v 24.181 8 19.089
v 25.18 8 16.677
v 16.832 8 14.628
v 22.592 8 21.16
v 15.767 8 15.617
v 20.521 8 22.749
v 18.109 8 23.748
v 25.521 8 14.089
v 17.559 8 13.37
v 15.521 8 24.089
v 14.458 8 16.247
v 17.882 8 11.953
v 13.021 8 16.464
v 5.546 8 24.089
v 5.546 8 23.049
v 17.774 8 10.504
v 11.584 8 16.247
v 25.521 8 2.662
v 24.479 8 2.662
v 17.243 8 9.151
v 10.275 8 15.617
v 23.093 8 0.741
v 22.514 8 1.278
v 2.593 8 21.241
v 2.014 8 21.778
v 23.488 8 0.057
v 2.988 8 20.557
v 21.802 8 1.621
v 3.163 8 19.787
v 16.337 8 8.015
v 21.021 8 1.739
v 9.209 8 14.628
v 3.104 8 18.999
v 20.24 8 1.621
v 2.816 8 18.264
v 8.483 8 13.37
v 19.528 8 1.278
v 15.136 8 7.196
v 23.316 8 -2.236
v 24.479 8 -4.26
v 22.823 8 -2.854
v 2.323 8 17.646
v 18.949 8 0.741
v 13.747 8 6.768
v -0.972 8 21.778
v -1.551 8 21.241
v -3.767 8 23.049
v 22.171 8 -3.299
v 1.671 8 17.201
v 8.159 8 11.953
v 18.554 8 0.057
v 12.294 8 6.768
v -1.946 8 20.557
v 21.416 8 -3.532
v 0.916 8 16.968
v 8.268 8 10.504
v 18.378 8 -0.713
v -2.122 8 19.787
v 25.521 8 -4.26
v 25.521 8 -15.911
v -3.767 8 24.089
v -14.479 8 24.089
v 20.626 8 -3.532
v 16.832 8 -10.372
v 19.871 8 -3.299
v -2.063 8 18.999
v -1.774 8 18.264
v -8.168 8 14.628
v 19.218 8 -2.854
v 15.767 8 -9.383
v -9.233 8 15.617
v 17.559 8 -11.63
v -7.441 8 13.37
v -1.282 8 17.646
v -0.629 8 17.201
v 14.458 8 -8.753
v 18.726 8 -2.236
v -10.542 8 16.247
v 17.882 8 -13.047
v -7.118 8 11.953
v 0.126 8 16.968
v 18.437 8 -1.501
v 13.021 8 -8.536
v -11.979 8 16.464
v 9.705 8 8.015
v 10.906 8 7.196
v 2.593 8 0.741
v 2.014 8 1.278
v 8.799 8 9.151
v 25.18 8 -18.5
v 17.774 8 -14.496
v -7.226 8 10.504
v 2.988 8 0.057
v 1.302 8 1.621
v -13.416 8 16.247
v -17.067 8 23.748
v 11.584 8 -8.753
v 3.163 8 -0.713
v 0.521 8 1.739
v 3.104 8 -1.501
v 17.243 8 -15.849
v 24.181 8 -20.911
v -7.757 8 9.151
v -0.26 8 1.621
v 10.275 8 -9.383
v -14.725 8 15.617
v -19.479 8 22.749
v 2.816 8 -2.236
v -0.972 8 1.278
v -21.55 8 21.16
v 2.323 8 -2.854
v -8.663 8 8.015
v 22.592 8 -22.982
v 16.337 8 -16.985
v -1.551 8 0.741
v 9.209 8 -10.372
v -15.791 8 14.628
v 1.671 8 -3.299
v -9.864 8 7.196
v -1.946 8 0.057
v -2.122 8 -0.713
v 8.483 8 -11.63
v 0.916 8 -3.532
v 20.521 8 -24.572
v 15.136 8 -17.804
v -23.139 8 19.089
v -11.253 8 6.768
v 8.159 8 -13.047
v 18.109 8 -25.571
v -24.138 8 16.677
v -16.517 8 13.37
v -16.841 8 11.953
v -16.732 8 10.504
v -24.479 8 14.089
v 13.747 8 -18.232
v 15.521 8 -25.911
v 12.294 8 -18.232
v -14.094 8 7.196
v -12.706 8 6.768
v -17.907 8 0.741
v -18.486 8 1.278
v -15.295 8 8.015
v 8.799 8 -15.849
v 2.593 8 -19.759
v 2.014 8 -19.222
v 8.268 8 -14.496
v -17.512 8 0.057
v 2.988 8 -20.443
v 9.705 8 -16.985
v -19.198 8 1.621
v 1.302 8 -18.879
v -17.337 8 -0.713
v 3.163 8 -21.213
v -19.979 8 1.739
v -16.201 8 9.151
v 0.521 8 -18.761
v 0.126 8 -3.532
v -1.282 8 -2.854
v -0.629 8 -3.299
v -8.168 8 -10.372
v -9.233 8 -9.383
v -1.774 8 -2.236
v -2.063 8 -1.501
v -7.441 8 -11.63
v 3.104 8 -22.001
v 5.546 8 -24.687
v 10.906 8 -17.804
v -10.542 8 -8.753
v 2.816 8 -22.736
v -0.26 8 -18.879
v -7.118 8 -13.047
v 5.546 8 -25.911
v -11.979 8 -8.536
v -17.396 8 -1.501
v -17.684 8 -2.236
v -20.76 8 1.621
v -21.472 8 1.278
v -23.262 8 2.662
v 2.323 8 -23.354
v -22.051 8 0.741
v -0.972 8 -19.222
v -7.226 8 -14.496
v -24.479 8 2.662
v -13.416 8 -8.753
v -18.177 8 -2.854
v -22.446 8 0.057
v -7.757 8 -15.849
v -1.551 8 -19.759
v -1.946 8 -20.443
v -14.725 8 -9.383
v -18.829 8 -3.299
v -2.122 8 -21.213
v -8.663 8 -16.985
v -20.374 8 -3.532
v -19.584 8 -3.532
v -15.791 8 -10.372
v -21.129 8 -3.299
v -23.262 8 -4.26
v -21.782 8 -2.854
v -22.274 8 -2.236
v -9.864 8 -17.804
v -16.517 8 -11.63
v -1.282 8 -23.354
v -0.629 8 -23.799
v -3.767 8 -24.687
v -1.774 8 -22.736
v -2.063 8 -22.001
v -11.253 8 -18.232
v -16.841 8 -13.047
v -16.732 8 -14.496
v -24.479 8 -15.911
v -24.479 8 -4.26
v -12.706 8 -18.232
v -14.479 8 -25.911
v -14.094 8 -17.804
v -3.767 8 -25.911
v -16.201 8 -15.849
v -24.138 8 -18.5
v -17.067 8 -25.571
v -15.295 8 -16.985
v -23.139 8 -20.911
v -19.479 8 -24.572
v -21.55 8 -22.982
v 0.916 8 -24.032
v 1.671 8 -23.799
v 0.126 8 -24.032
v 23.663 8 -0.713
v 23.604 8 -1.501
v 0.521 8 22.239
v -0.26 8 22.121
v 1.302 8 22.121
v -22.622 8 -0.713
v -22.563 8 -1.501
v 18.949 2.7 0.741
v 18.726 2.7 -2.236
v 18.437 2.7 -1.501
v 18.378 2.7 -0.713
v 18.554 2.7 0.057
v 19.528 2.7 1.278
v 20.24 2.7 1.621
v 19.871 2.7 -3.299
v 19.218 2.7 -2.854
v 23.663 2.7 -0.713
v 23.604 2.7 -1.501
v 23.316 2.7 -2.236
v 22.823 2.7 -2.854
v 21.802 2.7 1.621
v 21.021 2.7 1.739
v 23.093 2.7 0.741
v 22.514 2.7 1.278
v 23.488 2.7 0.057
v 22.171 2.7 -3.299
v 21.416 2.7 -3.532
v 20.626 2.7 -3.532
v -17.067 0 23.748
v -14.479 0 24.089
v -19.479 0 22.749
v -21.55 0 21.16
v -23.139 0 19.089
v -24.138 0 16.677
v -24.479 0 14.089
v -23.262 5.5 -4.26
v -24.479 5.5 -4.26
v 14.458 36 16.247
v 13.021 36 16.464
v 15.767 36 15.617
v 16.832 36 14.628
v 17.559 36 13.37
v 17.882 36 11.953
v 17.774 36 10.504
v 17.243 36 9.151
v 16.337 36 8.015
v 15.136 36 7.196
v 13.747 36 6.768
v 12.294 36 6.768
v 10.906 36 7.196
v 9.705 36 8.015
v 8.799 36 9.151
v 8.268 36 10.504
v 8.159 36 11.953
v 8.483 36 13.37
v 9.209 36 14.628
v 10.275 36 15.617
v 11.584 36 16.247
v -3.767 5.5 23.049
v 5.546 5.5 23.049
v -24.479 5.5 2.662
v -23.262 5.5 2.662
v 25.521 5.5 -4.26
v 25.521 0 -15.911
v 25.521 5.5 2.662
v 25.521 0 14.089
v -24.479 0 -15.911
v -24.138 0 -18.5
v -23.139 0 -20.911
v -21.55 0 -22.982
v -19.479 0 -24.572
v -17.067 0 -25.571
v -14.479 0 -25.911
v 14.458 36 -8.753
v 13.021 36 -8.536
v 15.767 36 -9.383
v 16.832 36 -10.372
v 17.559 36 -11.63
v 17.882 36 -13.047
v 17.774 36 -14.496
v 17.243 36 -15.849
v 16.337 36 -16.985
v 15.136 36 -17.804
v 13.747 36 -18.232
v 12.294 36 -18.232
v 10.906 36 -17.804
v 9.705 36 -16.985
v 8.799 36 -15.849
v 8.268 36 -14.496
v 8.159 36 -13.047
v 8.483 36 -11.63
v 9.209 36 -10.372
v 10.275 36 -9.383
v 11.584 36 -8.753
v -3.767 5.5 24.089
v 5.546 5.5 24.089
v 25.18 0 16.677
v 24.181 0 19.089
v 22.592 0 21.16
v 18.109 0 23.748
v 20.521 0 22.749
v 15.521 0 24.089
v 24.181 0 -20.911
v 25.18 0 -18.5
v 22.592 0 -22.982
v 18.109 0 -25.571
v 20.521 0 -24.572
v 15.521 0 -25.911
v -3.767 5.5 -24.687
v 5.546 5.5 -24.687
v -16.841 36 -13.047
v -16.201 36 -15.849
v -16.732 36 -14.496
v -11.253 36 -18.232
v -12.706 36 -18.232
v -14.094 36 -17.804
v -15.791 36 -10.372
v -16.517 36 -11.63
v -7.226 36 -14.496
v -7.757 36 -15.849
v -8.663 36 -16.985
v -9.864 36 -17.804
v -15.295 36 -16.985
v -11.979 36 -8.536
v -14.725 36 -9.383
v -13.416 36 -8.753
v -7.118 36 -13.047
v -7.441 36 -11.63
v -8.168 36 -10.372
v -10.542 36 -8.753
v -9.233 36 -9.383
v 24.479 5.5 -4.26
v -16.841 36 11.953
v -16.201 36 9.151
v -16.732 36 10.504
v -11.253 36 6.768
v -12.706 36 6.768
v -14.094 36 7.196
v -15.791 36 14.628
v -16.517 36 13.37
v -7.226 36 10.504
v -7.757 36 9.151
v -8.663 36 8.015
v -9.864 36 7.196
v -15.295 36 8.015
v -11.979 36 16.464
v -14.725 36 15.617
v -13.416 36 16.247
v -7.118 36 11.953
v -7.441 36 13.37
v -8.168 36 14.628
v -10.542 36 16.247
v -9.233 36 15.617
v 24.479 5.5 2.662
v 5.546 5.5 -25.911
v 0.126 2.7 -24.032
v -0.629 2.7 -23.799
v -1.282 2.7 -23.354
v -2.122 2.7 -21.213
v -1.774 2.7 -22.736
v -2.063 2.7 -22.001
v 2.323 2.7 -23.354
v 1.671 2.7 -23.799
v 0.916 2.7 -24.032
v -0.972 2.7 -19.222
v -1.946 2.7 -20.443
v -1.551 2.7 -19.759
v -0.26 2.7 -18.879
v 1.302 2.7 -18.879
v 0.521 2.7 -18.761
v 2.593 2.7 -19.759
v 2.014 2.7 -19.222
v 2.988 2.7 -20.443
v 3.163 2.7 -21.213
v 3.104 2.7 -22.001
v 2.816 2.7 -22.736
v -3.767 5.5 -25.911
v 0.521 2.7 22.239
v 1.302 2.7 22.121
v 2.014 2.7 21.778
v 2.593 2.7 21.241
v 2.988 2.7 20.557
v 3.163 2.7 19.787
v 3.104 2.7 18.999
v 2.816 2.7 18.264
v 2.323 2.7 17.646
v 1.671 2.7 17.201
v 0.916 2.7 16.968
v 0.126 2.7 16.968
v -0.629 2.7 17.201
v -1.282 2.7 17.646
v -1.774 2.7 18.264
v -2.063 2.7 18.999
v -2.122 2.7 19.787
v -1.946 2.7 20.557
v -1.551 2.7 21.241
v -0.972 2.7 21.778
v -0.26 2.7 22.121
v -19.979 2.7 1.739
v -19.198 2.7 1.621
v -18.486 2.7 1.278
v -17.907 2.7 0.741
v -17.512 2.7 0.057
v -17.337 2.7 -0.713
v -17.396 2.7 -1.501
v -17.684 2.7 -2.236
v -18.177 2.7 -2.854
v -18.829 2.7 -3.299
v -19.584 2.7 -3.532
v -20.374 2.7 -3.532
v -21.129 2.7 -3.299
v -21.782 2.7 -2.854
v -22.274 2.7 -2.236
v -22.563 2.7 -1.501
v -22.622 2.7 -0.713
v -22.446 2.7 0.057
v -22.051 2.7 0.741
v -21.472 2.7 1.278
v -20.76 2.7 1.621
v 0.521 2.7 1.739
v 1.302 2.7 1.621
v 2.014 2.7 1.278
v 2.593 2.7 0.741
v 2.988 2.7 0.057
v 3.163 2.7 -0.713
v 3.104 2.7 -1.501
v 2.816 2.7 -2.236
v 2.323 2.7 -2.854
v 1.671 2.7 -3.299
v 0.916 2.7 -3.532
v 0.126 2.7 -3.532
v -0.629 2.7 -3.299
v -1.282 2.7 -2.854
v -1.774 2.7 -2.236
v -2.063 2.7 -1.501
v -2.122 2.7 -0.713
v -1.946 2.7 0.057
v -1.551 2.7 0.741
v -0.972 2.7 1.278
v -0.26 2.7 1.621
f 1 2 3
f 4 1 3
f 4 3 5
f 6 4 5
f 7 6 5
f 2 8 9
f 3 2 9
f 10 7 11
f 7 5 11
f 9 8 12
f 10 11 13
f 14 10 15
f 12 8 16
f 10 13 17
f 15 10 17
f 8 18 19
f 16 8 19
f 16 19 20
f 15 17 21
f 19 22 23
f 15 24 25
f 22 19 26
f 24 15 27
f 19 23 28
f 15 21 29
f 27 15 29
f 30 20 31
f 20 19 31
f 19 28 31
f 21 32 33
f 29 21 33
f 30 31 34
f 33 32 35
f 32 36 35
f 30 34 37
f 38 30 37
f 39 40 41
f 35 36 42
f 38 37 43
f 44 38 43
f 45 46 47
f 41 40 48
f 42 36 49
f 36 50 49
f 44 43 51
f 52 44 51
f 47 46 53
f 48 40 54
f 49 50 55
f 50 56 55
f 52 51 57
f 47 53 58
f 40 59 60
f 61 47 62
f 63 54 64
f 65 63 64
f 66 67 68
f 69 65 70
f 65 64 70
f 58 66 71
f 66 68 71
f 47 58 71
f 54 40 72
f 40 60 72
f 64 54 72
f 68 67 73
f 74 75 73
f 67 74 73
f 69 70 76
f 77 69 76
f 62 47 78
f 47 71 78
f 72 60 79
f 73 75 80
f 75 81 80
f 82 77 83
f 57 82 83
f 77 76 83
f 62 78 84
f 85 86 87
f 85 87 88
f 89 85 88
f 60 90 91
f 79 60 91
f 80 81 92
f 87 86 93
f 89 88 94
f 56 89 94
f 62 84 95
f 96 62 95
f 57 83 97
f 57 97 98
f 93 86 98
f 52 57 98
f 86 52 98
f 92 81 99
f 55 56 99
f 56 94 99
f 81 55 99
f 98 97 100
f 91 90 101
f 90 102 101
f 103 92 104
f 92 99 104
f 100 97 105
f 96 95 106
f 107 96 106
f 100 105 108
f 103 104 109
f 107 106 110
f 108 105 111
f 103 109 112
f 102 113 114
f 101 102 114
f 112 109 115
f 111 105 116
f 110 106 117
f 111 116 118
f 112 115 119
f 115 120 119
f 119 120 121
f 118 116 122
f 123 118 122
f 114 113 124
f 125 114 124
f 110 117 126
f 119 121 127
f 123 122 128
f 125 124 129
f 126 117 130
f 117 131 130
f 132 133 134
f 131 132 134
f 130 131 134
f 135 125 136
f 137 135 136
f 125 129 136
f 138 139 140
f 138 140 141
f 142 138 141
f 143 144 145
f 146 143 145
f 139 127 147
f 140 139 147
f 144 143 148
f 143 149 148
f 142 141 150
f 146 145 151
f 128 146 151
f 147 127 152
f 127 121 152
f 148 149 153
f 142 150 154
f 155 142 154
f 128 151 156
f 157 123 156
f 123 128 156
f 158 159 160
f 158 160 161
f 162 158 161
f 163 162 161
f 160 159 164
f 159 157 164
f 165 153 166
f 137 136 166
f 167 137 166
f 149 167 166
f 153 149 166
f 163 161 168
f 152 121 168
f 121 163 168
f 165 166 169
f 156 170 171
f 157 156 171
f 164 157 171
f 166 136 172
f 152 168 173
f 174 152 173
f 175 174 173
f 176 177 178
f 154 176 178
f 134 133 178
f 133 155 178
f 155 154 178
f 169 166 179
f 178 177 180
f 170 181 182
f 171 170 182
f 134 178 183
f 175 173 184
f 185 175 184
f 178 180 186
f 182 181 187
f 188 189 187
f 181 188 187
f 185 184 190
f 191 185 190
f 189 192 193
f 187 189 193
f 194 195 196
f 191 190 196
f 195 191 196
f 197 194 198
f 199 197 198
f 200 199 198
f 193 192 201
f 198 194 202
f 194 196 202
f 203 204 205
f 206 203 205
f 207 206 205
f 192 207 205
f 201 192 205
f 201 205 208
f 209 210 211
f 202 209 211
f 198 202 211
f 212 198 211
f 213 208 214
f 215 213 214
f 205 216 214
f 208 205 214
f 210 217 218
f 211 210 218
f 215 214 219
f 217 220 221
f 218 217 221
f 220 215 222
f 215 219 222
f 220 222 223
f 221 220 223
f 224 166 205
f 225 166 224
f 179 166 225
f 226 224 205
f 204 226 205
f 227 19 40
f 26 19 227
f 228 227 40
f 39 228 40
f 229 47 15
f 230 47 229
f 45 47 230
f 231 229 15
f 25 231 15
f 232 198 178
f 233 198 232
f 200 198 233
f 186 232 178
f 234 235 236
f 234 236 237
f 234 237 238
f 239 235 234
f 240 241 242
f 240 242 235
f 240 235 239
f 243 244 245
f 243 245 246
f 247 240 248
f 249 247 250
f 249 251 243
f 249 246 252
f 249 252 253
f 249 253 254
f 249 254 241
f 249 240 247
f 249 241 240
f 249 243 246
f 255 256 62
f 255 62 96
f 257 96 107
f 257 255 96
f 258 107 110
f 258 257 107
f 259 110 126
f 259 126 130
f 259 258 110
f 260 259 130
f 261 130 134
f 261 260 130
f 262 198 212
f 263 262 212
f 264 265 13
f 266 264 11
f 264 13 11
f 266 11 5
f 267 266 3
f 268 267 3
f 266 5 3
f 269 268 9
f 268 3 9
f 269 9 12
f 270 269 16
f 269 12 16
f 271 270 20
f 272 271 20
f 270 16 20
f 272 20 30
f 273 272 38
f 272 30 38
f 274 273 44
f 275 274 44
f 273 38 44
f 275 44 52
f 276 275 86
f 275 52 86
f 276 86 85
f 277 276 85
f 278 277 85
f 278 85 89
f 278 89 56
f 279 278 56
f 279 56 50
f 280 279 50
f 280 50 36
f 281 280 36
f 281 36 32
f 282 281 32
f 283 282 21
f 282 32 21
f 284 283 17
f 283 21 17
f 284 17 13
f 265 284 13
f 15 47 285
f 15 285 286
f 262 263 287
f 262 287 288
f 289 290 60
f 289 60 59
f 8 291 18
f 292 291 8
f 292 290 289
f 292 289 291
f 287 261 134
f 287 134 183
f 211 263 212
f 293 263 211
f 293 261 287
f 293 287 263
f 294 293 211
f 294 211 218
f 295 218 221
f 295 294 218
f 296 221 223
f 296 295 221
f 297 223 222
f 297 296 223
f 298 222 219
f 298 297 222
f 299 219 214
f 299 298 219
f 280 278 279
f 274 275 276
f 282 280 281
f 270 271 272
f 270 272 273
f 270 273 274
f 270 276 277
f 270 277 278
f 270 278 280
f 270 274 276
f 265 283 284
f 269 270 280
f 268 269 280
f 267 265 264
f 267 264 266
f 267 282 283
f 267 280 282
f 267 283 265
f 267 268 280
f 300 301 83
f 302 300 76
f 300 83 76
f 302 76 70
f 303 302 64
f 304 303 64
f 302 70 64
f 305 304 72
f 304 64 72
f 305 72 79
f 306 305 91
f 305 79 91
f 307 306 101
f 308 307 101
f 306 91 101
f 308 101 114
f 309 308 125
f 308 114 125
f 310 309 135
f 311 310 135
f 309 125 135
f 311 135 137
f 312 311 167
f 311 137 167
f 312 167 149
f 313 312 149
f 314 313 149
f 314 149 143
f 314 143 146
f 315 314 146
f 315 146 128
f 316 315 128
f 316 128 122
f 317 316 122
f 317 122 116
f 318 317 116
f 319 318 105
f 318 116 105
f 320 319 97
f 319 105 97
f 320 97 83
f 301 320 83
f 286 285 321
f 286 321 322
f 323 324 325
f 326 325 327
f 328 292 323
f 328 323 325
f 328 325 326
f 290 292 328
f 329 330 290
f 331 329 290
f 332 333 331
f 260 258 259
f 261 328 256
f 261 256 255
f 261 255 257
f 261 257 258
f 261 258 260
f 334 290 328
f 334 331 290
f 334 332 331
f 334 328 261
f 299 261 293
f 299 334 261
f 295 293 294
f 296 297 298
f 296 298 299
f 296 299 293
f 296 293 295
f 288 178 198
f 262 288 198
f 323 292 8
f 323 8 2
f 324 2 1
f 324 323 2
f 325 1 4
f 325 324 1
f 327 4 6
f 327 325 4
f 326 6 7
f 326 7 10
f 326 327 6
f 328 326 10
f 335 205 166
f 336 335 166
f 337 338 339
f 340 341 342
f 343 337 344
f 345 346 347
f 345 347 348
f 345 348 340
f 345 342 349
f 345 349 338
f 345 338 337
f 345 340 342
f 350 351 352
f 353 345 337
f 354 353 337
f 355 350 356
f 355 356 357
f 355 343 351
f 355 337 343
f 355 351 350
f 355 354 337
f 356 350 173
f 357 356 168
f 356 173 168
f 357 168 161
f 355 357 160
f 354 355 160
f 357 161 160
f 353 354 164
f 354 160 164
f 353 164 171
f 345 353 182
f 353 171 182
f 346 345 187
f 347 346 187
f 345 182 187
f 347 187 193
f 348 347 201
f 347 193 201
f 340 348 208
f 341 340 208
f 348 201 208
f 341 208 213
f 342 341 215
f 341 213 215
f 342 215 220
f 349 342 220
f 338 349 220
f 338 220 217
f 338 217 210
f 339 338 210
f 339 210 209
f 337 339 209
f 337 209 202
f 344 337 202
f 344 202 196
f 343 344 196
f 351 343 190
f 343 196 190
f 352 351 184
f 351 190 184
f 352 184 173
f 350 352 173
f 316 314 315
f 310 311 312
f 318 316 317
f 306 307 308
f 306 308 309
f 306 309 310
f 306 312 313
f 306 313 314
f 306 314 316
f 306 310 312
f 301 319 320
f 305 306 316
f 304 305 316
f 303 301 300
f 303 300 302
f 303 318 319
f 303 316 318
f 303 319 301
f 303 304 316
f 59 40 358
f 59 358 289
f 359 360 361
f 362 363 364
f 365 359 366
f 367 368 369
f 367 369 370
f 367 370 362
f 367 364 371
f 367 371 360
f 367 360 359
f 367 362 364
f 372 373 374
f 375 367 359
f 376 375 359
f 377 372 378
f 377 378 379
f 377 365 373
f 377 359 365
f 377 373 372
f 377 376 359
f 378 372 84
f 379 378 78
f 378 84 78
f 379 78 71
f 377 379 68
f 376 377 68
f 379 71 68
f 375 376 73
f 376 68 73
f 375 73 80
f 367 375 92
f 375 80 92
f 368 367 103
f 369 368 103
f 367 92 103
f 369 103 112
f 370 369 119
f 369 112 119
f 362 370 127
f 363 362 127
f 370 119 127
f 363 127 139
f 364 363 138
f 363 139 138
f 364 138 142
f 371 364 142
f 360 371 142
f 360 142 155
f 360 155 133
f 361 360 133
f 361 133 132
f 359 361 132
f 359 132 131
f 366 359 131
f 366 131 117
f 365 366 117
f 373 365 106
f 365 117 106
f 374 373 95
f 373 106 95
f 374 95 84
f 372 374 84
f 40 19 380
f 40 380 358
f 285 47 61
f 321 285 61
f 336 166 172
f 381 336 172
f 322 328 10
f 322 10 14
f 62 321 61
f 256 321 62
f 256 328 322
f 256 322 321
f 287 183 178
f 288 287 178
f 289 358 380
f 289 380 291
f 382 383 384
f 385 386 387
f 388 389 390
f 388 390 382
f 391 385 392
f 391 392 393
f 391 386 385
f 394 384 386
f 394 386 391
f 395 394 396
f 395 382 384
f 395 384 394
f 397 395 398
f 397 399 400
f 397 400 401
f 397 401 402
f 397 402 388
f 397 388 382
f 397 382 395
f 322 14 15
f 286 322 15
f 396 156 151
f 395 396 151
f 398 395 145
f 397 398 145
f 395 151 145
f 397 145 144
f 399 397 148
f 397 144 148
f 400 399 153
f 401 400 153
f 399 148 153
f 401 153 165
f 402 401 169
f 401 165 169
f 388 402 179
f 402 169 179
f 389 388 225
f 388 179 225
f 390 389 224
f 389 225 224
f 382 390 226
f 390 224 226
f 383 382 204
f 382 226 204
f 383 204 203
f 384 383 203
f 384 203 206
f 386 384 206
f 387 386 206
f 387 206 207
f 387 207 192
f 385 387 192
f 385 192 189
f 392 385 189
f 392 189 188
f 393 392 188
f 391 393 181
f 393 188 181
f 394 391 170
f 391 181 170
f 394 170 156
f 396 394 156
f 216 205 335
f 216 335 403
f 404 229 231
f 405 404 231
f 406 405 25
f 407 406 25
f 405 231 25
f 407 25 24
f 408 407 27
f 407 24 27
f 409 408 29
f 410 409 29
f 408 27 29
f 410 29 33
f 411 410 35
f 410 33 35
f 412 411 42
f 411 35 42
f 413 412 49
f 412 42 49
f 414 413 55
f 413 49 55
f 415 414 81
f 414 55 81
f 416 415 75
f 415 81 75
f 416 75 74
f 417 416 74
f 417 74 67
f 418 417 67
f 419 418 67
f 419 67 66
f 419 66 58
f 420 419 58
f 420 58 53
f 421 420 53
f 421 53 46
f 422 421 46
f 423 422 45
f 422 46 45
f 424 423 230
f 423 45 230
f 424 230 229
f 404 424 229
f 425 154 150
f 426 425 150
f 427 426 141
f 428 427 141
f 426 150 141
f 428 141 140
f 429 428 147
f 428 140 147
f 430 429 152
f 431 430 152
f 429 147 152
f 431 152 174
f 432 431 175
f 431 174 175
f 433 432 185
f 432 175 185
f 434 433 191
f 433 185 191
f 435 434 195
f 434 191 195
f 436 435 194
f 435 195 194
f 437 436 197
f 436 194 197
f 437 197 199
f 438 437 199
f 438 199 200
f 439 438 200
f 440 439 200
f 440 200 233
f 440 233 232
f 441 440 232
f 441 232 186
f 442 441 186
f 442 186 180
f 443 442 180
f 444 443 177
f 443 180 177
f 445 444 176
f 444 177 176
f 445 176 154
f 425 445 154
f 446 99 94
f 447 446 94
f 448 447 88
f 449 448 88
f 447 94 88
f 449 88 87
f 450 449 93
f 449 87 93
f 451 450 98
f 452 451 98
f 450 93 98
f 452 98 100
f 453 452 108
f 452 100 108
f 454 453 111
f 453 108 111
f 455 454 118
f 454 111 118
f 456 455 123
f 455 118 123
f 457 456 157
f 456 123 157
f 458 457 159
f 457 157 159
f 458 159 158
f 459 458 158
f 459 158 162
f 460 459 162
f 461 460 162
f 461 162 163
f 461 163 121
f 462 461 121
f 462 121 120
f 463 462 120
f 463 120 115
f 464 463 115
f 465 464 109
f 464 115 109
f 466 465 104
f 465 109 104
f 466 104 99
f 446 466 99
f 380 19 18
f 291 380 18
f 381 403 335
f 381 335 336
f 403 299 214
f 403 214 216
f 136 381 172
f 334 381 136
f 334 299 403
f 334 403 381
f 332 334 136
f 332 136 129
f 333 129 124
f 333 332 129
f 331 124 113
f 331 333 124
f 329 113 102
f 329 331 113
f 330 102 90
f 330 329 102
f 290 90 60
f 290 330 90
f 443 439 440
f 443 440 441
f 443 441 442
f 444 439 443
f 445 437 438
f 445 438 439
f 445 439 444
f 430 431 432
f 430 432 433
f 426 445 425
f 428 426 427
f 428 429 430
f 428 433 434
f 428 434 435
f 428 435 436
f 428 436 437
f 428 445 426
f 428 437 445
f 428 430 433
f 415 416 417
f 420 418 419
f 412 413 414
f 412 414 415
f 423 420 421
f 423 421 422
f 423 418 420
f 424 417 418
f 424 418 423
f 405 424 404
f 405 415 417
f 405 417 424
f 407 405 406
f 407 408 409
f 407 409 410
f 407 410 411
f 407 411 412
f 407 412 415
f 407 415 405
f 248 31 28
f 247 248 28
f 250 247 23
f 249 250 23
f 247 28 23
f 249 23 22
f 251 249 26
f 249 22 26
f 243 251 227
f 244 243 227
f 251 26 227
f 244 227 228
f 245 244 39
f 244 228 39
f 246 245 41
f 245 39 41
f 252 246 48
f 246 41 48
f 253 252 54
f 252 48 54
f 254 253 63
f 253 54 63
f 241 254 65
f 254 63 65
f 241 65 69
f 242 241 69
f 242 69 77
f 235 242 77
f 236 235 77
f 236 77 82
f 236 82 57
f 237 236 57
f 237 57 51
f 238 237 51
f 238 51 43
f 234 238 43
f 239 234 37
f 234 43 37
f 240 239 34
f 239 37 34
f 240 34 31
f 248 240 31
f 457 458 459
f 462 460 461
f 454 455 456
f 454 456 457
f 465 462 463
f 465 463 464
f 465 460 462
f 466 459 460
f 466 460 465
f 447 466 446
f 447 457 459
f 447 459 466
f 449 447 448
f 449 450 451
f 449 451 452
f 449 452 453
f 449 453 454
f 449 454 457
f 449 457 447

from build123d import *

# Parameters (mm, degrees)
SALIENTE_EXTRUIR1_DEPTH = 8
CROQUIS2_R              = 4.875
SALIENTE_EXTRUIR2_DEPTH = 28
MATRIZL1_COUNT          = 2
MATRIZL1_PITCH          = 25
MATRIZL1_COUNT_DIR2     = 2
MATRIZL1_PITCH_DIR2     = 25
CROQUIS3_R              = 2.65
CORTAR_EXTRUIR1_DEPTH   = 5.3
CROQUIS4_W              = 9.313425885
CROQUIS4_H              = 1.82271115
CROQUIS4_H_2            = 1.039944003
CROQUIS4_W_2            = 1.041549228
CROQUIS4_H_3            = 6.922662644
CROQUIS4_H_4            = 1.224371708
CORTAR_EXTRUIR2_DEPTH   = 2.5


with BuildPart() as part:
    # Croquis1 → Saliente-Extruir1 (new body)
    with BuildSketch(Plane(origin=(0, 0, 0), x_dir=(1, 0, 0), z_dir=(0, 1, 0))):
        with BuildLine():
            Line((-14.479225386, 25.911355575), (15.520774614, 25.911355575))
            ThreePointArc((15.520774614, 25.911355575), (22.591842426, 22.982423386), (25.520774614, 15.911355575))
            Line((25.520774614, 15.911355575), (25.520774614, -14.088644425))
            ThreePointArc((25.520774614, -14.088644425), (22.591842426, -21.159712237), (15.520774614, -24.088644425))
            Line((15.520774614, -24.088644425), (-14.479225386, -24.088644425))
            ThreePointArc((-14.479225386, -24.088644425), (-21.550293198, -21.159712237), (-24.479225386, -14.088644425))
            Line((-24.479225386, -14.088644425), (-24.479225386, 15.911355575))
            ThreePointArc((-24.479225386, 15.911355575), (-21.550293198, 22.982423386), (-14.479225386, 25.911355575))
        make_face()
    extrude(amount=SALIENTE_EXTRUIR1_DEPTH)

    # Croquis2 → Saliente-Extruir2 (add)
    with BuildSketch(Plane(origin=(0, 8, 0), x_dir=(1, 0, 0), z_dir=(0, 1, 0))):
        with Locations(Location((-11.979225386, 13.411355575, 0), (0, 0, 270))):
            Circle(CROQUIS2_R)
    saliente_extruir2 = extrude(amount=SALIENTE_EXTRUIR2_DEPTH)

    # MatrizL1: Saliente-Extruir2 2 × 2
    with Locations(*[(i * MATRIZL1_PITCH, 0, j * MATRIZL1_PITCH_DIR2) for i in range(MATRIZL1_COUNT) for j in range(MATRIZL1_COUNT_DIR2) if (i, j) != (0, 0)]):
        add(saliente_extruir2)

    # Croquis3 → Cortar-Extruir1 (cut)
    with BuildSketch(Plane(origin=(0, 8, 0), x_dir=(1, 0, 0), z_dir=(0, 1, 0))):
        with Locations(Location((0.520774614, 0.911355575, 0), (0, 0, 270))):
            Circle(CROQUIS3_R)
        with Locations(Location((0.520774614, 21.411355575, 0), (0, 0, 270))):
            Circle(CROQUIS3_R)
        with Locations(Location((0.520774614, -19.588644425, 0), (0, 0, 270))):
            Circle(CROQUIS3_R)
        with Locations(Location((-19.979225386, 0.911355575, 0), (0, 0, 270))):
            Circle(CROQUIS3_R)
        with Locations(Location((21.020774614, 0.911355575, 0), (0, 0, 270))):
            Circle(CROQUIS3_R)
    extrude(amount=-CORTAR_EXTRUIR1_DEPTH, mode=Mode.SUBTRACT)

    # Croquis4 → Cortar-Extruir2 (cut)
    with BuildSketch(Plane(origin=(0, 8, 0), x_dir=(1, 0, 0), z_dir=(0, 1, 0))):
        with Locations((0.889291465, -25)):
            Rectangle(CROQUIS4_W, CROQUIS4_H)
        with Locations((0.889291465, -23.568672424)):
            Rectangle(CROQUIS4_W, CROQUIS4_H_2)
        with Locations((25, 0.799054751)):
            Rectangle(CROQUIS4_W_2, CROQUIS4_H_3)
        with Locations((0.889291465, 25.299169721)):
            Rectangle(CROQUIS4_W, CROQUIS4_H_4)
        Polygon((-26.668299848, 4.260386073), (-26.668299848, -2.662276571), (-24.479225386, -2.662276571), (-23.262085841, -2.662276571), (-23.262085841, 4.260386073), (-24.479225386, 4.260386073), align=None)
    extrude(amount=-CORTAR_EXTRUIR2_DEPTH, mode=Mode.SUBTRACT)


solid = part.part
